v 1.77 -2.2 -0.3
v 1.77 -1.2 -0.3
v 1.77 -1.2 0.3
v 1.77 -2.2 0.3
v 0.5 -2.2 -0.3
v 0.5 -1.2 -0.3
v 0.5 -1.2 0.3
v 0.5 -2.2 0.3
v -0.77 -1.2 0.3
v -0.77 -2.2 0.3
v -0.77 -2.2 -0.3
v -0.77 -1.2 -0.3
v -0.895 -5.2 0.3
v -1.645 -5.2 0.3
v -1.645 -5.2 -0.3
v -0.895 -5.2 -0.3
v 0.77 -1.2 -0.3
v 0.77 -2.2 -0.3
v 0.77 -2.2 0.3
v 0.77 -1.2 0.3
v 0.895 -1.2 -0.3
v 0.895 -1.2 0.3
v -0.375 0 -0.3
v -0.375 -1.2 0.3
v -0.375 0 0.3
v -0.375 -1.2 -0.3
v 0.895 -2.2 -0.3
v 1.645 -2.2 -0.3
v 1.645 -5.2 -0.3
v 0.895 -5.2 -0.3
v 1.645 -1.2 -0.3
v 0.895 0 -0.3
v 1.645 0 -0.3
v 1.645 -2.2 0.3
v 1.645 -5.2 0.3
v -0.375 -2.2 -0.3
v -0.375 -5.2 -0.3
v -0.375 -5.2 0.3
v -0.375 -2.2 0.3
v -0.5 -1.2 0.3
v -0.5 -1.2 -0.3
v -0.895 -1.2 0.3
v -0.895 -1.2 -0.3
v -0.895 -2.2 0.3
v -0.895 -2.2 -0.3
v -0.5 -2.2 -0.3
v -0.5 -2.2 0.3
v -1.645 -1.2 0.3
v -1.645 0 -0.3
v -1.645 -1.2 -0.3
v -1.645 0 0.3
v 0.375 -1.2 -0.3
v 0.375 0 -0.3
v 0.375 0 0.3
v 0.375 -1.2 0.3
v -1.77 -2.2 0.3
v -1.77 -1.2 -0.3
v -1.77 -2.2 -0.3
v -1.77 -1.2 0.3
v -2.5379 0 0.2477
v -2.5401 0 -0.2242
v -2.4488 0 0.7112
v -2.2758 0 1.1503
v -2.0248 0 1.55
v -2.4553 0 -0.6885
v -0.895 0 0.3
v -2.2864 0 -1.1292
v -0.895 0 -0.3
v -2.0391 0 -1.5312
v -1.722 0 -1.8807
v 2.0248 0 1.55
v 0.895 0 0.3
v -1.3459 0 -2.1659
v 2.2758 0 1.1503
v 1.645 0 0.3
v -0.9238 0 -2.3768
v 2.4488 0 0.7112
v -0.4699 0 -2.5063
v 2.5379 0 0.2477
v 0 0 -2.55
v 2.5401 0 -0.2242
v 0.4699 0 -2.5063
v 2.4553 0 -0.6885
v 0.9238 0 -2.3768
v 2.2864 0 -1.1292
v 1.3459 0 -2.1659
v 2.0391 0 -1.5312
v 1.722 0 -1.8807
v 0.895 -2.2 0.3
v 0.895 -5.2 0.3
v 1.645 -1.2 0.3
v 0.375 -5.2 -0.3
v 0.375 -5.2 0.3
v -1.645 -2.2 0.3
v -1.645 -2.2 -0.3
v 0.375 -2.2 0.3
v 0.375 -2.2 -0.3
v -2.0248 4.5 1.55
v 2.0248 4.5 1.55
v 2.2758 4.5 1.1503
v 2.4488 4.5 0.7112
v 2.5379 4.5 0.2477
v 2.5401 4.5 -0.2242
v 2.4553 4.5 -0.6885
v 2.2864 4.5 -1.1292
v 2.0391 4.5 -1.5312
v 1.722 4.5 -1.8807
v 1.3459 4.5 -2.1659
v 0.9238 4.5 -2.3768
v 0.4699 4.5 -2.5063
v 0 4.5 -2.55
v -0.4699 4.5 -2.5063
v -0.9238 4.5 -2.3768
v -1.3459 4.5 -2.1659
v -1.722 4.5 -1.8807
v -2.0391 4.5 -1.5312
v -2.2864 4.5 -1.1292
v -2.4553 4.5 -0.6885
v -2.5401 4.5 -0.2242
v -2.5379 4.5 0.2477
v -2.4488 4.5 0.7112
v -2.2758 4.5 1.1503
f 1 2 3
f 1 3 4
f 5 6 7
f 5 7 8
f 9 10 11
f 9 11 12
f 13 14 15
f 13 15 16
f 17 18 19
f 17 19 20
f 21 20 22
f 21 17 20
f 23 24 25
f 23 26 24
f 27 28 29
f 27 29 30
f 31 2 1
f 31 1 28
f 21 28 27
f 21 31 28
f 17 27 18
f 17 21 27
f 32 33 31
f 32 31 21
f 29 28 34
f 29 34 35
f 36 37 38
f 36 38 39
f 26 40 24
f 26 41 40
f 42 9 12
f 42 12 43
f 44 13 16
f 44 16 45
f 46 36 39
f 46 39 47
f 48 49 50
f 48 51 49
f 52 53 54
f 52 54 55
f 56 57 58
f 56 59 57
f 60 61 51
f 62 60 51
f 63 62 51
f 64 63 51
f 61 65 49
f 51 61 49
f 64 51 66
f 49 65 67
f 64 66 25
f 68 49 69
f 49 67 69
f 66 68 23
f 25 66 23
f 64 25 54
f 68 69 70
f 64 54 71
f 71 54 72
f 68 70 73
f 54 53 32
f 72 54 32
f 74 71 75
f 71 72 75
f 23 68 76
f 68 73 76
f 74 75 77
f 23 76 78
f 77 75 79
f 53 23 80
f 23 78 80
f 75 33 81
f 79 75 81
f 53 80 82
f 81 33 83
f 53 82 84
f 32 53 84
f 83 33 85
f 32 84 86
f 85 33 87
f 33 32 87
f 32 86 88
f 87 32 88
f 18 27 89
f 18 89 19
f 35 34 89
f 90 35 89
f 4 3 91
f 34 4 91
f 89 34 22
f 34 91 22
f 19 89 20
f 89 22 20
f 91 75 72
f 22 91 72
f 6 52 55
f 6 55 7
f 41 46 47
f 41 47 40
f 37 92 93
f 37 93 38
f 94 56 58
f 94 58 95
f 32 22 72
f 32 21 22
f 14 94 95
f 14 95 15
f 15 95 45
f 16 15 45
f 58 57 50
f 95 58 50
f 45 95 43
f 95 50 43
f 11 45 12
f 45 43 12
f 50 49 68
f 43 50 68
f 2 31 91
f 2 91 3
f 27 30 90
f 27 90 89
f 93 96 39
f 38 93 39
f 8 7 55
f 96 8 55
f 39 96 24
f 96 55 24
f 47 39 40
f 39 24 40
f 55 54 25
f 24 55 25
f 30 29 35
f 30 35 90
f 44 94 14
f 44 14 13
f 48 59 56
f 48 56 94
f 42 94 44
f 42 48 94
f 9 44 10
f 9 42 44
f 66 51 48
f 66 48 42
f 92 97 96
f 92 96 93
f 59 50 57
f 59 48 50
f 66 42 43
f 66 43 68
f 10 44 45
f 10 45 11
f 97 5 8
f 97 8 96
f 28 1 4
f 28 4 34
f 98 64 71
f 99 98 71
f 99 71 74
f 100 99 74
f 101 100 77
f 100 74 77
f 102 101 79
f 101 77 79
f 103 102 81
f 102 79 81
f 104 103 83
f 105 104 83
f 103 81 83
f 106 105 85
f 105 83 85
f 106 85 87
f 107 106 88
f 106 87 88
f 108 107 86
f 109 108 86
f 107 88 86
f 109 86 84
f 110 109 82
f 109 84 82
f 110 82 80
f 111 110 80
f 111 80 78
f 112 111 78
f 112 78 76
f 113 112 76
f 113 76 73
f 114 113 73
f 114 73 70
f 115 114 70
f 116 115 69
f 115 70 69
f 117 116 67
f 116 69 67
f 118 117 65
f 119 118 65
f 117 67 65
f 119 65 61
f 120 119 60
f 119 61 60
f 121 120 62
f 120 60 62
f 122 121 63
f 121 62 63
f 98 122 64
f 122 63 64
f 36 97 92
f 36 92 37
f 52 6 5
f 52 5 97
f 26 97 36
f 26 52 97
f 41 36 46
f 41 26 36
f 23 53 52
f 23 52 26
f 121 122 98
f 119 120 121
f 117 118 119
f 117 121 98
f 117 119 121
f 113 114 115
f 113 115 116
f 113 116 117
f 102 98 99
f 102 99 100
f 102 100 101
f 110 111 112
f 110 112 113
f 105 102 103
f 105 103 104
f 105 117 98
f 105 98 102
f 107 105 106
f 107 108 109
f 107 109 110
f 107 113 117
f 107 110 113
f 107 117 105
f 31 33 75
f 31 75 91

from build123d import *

# Parameters (mm, degrees)
EXTRUDE_1_DEPTH = 4.5
EXTRUDE_2_DEPTH = 0.3


with BuildPart() as part:
    # Эскиз1 → Бобышка-Вытянуть1 (new body)
    with BuildSketch(Plane(origin=(0, 0, 0), x_dir=(1, 0, 0), z_dir=(0, 1, 0))):
        with BuildLine():
            Line((-2.024845673, -1.55), (2.024845673, -1.55))
            ThreePointArc((2.024845673, -1.55), (0, 2.55), (-2.024845673, -1.55))
        make_face()
    extrude(amount=EXTRUDE_1_DEPTH)

    # Эскиз3 → Бобышка-Вытянуть2 (add, symmetric)
    with BuildSketch(Plane.XY):
        Polygon((-0.375, 0), (0.375, 0), (0.375, -1.2), (0.5, -1.2), (0.5, -2.2), (0.375, -2.2), (0.375, -5.2), (-0.375, -5.2), (-0.375, -2.2), (-0.5, -2.2), (-0.5, -1.2), (-0.375, -1.2), align=None)
        Polygon((0.895, 0), (1.645, 0), (1.645, -1.2), (1.77, -1.2), (1.77, -2.2), (1.645, -2.2), (1.645, -5.2), (0.895, -5.2), (0.895, -2.2), (0.77, -2.2), (0.77, -1.2), (0.895, -1.2), align=None)
        Polygon((-1.77, -1.2), (-1.77, -2.2), (-1.645, -2.2), (-1.645, -5.2), (-0.895, -5.2), (-0.895, -2.2), (-0.77, -2.2), (-0.77, -1.2), (-0.895, -1.2), (-0.895, 0), (-1.645, 0), (-1.645, -1.2), align=None)
    extrude(amount=EXTRUDE_2_DEPTH, both=True)


solid = part.part
